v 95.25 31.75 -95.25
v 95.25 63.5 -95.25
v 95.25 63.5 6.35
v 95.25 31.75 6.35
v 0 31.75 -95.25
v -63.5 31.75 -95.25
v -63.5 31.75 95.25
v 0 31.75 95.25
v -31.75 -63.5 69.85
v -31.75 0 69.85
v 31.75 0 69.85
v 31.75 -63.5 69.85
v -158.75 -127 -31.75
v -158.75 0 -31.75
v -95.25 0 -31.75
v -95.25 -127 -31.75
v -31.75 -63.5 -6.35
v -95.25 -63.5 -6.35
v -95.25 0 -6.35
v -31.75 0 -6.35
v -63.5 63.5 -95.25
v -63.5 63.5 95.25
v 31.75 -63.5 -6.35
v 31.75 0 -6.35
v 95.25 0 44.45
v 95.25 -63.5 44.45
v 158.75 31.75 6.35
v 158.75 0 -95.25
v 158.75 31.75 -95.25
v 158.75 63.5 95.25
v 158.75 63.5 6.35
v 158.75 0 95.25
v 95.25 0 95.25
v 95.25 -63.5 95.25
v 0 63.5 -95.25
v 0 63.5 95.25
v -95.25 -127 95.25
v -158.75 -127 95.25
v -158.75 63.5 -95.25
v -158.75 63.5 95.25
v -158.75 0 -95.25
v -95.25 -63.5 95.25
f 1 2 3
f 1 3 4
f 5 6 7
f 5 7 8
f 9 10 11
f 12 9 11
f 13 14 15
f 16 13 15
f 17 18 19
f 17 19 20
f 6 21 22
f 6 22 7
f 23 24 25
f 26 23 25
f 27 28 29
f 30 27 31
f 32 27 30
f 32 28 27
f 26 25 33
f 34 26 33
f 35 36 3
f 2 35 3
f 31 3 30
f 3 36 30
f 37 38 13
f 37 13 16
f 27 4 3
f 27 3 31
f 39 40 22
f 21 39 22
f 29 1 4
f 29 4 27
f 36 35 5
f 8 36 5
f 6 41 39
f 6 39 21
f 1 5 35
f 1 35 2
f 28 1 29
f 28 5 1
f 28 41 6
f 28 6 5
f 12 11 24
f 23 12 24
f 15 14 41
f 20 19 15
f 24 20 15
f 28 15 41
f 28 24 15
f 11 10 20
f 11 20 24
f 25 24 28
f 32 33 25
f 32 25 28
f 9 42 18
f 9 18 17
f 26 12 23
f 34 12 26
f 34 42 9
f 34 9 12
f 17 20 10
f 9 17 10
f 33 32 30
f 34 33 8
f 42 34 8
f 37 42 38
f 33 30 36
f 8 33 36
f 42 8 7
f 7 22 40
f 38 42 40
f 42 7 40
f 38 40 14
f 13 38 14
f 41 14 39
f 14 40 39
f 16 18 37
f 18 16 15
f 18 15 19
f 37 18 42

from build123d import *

# Parameters (mm, degrees)
F1_DEPTH = 63.5
F2_DEPTH = 127
F3_DEPTH = 63.5
F4_W     = 63.5
F4_H     = 31.75
F5_DEPTH = 101.6
F6_DEPTH = 190.501


with BuildPart() as f1:
    # F0 (on Front) → F1 (new body)
    with BuildSketch(Plane.XZ):
        Polygon((-158.75, -31.75), (-158.75, -95.25), (158.75, -95.25), (158.75, 95.25), (95.25, 95.25), (95.25, 44.45), (31.75, -6.35), (31.75, 69.85), (-31.75, 69.85), (-31.75, -6.35), (-95.25, -6.35), (-95.25, -31.75), align=None)
        Polygon((95.25, 44.45), (95.25, 95.25), (-95.25, 95.25), (-95.25, -6.35), (-31.75, -6.35), (-31.75, 69.85), (31.75, 69.85), (31.75, -6.35), align=None)
        Polygon((-158.75, 95.25), (-158.75, -31.75), (-95.25, -31.75), (-95.25, -6.35), (-95.25, 95.25), align=None)
    extrude(amount=-F1_DEPTH)

    # F0 (on Front) → F2 (join)
    with BuildSketch(Plane.XZ):
        Polygon((-158.75, 95.25), (-158.75, -31.75), (-95.25, -31.75), (-95.25, -6.35), (-95.25, 95.25), align=None)
    extrude(amount=F2_DEPTH)

    # F0 (on Front) → F3 (join)
    with BuildSketch(Plane.XZ):
        Polygon((95.25, 44.45), (95.25, 95.25), (-95.25, 95.25), (-95.25, -6.35), (-31.75, -6.35), (-31.75, 69.85), (31.75, 69.85), (31.75, -6.35), align=None)
    extrude(amount=F3_DEPTH)

    # F4 (on face) → F5 (cut)
    with BuildSketch(Plane(origin=(0, 0, -95.25), x_dir=(1, 0, 0), z_dir=(0, 0, -1))):
        with Locations((127, -47.625)):
            Rectangle(F4_W, F4_H)
    extrude(amount=-F5_DEPTH, mode=Mode.SUBTRACT)

    # F4 (on face) → F6 (cut, through all)
    with BuildSketch(Plane(origin=(0, 0, -95.25), x_dir=(1, 0, 0), z_dir=(0, 0, -1))):
        with Locations((-31.75, -47.625)):
            Rectangle(F4_W, F4_H)
    extrude(amount=-F6_DEPTH, mode=Mode.SUBTRACT)


solid = f1.part
